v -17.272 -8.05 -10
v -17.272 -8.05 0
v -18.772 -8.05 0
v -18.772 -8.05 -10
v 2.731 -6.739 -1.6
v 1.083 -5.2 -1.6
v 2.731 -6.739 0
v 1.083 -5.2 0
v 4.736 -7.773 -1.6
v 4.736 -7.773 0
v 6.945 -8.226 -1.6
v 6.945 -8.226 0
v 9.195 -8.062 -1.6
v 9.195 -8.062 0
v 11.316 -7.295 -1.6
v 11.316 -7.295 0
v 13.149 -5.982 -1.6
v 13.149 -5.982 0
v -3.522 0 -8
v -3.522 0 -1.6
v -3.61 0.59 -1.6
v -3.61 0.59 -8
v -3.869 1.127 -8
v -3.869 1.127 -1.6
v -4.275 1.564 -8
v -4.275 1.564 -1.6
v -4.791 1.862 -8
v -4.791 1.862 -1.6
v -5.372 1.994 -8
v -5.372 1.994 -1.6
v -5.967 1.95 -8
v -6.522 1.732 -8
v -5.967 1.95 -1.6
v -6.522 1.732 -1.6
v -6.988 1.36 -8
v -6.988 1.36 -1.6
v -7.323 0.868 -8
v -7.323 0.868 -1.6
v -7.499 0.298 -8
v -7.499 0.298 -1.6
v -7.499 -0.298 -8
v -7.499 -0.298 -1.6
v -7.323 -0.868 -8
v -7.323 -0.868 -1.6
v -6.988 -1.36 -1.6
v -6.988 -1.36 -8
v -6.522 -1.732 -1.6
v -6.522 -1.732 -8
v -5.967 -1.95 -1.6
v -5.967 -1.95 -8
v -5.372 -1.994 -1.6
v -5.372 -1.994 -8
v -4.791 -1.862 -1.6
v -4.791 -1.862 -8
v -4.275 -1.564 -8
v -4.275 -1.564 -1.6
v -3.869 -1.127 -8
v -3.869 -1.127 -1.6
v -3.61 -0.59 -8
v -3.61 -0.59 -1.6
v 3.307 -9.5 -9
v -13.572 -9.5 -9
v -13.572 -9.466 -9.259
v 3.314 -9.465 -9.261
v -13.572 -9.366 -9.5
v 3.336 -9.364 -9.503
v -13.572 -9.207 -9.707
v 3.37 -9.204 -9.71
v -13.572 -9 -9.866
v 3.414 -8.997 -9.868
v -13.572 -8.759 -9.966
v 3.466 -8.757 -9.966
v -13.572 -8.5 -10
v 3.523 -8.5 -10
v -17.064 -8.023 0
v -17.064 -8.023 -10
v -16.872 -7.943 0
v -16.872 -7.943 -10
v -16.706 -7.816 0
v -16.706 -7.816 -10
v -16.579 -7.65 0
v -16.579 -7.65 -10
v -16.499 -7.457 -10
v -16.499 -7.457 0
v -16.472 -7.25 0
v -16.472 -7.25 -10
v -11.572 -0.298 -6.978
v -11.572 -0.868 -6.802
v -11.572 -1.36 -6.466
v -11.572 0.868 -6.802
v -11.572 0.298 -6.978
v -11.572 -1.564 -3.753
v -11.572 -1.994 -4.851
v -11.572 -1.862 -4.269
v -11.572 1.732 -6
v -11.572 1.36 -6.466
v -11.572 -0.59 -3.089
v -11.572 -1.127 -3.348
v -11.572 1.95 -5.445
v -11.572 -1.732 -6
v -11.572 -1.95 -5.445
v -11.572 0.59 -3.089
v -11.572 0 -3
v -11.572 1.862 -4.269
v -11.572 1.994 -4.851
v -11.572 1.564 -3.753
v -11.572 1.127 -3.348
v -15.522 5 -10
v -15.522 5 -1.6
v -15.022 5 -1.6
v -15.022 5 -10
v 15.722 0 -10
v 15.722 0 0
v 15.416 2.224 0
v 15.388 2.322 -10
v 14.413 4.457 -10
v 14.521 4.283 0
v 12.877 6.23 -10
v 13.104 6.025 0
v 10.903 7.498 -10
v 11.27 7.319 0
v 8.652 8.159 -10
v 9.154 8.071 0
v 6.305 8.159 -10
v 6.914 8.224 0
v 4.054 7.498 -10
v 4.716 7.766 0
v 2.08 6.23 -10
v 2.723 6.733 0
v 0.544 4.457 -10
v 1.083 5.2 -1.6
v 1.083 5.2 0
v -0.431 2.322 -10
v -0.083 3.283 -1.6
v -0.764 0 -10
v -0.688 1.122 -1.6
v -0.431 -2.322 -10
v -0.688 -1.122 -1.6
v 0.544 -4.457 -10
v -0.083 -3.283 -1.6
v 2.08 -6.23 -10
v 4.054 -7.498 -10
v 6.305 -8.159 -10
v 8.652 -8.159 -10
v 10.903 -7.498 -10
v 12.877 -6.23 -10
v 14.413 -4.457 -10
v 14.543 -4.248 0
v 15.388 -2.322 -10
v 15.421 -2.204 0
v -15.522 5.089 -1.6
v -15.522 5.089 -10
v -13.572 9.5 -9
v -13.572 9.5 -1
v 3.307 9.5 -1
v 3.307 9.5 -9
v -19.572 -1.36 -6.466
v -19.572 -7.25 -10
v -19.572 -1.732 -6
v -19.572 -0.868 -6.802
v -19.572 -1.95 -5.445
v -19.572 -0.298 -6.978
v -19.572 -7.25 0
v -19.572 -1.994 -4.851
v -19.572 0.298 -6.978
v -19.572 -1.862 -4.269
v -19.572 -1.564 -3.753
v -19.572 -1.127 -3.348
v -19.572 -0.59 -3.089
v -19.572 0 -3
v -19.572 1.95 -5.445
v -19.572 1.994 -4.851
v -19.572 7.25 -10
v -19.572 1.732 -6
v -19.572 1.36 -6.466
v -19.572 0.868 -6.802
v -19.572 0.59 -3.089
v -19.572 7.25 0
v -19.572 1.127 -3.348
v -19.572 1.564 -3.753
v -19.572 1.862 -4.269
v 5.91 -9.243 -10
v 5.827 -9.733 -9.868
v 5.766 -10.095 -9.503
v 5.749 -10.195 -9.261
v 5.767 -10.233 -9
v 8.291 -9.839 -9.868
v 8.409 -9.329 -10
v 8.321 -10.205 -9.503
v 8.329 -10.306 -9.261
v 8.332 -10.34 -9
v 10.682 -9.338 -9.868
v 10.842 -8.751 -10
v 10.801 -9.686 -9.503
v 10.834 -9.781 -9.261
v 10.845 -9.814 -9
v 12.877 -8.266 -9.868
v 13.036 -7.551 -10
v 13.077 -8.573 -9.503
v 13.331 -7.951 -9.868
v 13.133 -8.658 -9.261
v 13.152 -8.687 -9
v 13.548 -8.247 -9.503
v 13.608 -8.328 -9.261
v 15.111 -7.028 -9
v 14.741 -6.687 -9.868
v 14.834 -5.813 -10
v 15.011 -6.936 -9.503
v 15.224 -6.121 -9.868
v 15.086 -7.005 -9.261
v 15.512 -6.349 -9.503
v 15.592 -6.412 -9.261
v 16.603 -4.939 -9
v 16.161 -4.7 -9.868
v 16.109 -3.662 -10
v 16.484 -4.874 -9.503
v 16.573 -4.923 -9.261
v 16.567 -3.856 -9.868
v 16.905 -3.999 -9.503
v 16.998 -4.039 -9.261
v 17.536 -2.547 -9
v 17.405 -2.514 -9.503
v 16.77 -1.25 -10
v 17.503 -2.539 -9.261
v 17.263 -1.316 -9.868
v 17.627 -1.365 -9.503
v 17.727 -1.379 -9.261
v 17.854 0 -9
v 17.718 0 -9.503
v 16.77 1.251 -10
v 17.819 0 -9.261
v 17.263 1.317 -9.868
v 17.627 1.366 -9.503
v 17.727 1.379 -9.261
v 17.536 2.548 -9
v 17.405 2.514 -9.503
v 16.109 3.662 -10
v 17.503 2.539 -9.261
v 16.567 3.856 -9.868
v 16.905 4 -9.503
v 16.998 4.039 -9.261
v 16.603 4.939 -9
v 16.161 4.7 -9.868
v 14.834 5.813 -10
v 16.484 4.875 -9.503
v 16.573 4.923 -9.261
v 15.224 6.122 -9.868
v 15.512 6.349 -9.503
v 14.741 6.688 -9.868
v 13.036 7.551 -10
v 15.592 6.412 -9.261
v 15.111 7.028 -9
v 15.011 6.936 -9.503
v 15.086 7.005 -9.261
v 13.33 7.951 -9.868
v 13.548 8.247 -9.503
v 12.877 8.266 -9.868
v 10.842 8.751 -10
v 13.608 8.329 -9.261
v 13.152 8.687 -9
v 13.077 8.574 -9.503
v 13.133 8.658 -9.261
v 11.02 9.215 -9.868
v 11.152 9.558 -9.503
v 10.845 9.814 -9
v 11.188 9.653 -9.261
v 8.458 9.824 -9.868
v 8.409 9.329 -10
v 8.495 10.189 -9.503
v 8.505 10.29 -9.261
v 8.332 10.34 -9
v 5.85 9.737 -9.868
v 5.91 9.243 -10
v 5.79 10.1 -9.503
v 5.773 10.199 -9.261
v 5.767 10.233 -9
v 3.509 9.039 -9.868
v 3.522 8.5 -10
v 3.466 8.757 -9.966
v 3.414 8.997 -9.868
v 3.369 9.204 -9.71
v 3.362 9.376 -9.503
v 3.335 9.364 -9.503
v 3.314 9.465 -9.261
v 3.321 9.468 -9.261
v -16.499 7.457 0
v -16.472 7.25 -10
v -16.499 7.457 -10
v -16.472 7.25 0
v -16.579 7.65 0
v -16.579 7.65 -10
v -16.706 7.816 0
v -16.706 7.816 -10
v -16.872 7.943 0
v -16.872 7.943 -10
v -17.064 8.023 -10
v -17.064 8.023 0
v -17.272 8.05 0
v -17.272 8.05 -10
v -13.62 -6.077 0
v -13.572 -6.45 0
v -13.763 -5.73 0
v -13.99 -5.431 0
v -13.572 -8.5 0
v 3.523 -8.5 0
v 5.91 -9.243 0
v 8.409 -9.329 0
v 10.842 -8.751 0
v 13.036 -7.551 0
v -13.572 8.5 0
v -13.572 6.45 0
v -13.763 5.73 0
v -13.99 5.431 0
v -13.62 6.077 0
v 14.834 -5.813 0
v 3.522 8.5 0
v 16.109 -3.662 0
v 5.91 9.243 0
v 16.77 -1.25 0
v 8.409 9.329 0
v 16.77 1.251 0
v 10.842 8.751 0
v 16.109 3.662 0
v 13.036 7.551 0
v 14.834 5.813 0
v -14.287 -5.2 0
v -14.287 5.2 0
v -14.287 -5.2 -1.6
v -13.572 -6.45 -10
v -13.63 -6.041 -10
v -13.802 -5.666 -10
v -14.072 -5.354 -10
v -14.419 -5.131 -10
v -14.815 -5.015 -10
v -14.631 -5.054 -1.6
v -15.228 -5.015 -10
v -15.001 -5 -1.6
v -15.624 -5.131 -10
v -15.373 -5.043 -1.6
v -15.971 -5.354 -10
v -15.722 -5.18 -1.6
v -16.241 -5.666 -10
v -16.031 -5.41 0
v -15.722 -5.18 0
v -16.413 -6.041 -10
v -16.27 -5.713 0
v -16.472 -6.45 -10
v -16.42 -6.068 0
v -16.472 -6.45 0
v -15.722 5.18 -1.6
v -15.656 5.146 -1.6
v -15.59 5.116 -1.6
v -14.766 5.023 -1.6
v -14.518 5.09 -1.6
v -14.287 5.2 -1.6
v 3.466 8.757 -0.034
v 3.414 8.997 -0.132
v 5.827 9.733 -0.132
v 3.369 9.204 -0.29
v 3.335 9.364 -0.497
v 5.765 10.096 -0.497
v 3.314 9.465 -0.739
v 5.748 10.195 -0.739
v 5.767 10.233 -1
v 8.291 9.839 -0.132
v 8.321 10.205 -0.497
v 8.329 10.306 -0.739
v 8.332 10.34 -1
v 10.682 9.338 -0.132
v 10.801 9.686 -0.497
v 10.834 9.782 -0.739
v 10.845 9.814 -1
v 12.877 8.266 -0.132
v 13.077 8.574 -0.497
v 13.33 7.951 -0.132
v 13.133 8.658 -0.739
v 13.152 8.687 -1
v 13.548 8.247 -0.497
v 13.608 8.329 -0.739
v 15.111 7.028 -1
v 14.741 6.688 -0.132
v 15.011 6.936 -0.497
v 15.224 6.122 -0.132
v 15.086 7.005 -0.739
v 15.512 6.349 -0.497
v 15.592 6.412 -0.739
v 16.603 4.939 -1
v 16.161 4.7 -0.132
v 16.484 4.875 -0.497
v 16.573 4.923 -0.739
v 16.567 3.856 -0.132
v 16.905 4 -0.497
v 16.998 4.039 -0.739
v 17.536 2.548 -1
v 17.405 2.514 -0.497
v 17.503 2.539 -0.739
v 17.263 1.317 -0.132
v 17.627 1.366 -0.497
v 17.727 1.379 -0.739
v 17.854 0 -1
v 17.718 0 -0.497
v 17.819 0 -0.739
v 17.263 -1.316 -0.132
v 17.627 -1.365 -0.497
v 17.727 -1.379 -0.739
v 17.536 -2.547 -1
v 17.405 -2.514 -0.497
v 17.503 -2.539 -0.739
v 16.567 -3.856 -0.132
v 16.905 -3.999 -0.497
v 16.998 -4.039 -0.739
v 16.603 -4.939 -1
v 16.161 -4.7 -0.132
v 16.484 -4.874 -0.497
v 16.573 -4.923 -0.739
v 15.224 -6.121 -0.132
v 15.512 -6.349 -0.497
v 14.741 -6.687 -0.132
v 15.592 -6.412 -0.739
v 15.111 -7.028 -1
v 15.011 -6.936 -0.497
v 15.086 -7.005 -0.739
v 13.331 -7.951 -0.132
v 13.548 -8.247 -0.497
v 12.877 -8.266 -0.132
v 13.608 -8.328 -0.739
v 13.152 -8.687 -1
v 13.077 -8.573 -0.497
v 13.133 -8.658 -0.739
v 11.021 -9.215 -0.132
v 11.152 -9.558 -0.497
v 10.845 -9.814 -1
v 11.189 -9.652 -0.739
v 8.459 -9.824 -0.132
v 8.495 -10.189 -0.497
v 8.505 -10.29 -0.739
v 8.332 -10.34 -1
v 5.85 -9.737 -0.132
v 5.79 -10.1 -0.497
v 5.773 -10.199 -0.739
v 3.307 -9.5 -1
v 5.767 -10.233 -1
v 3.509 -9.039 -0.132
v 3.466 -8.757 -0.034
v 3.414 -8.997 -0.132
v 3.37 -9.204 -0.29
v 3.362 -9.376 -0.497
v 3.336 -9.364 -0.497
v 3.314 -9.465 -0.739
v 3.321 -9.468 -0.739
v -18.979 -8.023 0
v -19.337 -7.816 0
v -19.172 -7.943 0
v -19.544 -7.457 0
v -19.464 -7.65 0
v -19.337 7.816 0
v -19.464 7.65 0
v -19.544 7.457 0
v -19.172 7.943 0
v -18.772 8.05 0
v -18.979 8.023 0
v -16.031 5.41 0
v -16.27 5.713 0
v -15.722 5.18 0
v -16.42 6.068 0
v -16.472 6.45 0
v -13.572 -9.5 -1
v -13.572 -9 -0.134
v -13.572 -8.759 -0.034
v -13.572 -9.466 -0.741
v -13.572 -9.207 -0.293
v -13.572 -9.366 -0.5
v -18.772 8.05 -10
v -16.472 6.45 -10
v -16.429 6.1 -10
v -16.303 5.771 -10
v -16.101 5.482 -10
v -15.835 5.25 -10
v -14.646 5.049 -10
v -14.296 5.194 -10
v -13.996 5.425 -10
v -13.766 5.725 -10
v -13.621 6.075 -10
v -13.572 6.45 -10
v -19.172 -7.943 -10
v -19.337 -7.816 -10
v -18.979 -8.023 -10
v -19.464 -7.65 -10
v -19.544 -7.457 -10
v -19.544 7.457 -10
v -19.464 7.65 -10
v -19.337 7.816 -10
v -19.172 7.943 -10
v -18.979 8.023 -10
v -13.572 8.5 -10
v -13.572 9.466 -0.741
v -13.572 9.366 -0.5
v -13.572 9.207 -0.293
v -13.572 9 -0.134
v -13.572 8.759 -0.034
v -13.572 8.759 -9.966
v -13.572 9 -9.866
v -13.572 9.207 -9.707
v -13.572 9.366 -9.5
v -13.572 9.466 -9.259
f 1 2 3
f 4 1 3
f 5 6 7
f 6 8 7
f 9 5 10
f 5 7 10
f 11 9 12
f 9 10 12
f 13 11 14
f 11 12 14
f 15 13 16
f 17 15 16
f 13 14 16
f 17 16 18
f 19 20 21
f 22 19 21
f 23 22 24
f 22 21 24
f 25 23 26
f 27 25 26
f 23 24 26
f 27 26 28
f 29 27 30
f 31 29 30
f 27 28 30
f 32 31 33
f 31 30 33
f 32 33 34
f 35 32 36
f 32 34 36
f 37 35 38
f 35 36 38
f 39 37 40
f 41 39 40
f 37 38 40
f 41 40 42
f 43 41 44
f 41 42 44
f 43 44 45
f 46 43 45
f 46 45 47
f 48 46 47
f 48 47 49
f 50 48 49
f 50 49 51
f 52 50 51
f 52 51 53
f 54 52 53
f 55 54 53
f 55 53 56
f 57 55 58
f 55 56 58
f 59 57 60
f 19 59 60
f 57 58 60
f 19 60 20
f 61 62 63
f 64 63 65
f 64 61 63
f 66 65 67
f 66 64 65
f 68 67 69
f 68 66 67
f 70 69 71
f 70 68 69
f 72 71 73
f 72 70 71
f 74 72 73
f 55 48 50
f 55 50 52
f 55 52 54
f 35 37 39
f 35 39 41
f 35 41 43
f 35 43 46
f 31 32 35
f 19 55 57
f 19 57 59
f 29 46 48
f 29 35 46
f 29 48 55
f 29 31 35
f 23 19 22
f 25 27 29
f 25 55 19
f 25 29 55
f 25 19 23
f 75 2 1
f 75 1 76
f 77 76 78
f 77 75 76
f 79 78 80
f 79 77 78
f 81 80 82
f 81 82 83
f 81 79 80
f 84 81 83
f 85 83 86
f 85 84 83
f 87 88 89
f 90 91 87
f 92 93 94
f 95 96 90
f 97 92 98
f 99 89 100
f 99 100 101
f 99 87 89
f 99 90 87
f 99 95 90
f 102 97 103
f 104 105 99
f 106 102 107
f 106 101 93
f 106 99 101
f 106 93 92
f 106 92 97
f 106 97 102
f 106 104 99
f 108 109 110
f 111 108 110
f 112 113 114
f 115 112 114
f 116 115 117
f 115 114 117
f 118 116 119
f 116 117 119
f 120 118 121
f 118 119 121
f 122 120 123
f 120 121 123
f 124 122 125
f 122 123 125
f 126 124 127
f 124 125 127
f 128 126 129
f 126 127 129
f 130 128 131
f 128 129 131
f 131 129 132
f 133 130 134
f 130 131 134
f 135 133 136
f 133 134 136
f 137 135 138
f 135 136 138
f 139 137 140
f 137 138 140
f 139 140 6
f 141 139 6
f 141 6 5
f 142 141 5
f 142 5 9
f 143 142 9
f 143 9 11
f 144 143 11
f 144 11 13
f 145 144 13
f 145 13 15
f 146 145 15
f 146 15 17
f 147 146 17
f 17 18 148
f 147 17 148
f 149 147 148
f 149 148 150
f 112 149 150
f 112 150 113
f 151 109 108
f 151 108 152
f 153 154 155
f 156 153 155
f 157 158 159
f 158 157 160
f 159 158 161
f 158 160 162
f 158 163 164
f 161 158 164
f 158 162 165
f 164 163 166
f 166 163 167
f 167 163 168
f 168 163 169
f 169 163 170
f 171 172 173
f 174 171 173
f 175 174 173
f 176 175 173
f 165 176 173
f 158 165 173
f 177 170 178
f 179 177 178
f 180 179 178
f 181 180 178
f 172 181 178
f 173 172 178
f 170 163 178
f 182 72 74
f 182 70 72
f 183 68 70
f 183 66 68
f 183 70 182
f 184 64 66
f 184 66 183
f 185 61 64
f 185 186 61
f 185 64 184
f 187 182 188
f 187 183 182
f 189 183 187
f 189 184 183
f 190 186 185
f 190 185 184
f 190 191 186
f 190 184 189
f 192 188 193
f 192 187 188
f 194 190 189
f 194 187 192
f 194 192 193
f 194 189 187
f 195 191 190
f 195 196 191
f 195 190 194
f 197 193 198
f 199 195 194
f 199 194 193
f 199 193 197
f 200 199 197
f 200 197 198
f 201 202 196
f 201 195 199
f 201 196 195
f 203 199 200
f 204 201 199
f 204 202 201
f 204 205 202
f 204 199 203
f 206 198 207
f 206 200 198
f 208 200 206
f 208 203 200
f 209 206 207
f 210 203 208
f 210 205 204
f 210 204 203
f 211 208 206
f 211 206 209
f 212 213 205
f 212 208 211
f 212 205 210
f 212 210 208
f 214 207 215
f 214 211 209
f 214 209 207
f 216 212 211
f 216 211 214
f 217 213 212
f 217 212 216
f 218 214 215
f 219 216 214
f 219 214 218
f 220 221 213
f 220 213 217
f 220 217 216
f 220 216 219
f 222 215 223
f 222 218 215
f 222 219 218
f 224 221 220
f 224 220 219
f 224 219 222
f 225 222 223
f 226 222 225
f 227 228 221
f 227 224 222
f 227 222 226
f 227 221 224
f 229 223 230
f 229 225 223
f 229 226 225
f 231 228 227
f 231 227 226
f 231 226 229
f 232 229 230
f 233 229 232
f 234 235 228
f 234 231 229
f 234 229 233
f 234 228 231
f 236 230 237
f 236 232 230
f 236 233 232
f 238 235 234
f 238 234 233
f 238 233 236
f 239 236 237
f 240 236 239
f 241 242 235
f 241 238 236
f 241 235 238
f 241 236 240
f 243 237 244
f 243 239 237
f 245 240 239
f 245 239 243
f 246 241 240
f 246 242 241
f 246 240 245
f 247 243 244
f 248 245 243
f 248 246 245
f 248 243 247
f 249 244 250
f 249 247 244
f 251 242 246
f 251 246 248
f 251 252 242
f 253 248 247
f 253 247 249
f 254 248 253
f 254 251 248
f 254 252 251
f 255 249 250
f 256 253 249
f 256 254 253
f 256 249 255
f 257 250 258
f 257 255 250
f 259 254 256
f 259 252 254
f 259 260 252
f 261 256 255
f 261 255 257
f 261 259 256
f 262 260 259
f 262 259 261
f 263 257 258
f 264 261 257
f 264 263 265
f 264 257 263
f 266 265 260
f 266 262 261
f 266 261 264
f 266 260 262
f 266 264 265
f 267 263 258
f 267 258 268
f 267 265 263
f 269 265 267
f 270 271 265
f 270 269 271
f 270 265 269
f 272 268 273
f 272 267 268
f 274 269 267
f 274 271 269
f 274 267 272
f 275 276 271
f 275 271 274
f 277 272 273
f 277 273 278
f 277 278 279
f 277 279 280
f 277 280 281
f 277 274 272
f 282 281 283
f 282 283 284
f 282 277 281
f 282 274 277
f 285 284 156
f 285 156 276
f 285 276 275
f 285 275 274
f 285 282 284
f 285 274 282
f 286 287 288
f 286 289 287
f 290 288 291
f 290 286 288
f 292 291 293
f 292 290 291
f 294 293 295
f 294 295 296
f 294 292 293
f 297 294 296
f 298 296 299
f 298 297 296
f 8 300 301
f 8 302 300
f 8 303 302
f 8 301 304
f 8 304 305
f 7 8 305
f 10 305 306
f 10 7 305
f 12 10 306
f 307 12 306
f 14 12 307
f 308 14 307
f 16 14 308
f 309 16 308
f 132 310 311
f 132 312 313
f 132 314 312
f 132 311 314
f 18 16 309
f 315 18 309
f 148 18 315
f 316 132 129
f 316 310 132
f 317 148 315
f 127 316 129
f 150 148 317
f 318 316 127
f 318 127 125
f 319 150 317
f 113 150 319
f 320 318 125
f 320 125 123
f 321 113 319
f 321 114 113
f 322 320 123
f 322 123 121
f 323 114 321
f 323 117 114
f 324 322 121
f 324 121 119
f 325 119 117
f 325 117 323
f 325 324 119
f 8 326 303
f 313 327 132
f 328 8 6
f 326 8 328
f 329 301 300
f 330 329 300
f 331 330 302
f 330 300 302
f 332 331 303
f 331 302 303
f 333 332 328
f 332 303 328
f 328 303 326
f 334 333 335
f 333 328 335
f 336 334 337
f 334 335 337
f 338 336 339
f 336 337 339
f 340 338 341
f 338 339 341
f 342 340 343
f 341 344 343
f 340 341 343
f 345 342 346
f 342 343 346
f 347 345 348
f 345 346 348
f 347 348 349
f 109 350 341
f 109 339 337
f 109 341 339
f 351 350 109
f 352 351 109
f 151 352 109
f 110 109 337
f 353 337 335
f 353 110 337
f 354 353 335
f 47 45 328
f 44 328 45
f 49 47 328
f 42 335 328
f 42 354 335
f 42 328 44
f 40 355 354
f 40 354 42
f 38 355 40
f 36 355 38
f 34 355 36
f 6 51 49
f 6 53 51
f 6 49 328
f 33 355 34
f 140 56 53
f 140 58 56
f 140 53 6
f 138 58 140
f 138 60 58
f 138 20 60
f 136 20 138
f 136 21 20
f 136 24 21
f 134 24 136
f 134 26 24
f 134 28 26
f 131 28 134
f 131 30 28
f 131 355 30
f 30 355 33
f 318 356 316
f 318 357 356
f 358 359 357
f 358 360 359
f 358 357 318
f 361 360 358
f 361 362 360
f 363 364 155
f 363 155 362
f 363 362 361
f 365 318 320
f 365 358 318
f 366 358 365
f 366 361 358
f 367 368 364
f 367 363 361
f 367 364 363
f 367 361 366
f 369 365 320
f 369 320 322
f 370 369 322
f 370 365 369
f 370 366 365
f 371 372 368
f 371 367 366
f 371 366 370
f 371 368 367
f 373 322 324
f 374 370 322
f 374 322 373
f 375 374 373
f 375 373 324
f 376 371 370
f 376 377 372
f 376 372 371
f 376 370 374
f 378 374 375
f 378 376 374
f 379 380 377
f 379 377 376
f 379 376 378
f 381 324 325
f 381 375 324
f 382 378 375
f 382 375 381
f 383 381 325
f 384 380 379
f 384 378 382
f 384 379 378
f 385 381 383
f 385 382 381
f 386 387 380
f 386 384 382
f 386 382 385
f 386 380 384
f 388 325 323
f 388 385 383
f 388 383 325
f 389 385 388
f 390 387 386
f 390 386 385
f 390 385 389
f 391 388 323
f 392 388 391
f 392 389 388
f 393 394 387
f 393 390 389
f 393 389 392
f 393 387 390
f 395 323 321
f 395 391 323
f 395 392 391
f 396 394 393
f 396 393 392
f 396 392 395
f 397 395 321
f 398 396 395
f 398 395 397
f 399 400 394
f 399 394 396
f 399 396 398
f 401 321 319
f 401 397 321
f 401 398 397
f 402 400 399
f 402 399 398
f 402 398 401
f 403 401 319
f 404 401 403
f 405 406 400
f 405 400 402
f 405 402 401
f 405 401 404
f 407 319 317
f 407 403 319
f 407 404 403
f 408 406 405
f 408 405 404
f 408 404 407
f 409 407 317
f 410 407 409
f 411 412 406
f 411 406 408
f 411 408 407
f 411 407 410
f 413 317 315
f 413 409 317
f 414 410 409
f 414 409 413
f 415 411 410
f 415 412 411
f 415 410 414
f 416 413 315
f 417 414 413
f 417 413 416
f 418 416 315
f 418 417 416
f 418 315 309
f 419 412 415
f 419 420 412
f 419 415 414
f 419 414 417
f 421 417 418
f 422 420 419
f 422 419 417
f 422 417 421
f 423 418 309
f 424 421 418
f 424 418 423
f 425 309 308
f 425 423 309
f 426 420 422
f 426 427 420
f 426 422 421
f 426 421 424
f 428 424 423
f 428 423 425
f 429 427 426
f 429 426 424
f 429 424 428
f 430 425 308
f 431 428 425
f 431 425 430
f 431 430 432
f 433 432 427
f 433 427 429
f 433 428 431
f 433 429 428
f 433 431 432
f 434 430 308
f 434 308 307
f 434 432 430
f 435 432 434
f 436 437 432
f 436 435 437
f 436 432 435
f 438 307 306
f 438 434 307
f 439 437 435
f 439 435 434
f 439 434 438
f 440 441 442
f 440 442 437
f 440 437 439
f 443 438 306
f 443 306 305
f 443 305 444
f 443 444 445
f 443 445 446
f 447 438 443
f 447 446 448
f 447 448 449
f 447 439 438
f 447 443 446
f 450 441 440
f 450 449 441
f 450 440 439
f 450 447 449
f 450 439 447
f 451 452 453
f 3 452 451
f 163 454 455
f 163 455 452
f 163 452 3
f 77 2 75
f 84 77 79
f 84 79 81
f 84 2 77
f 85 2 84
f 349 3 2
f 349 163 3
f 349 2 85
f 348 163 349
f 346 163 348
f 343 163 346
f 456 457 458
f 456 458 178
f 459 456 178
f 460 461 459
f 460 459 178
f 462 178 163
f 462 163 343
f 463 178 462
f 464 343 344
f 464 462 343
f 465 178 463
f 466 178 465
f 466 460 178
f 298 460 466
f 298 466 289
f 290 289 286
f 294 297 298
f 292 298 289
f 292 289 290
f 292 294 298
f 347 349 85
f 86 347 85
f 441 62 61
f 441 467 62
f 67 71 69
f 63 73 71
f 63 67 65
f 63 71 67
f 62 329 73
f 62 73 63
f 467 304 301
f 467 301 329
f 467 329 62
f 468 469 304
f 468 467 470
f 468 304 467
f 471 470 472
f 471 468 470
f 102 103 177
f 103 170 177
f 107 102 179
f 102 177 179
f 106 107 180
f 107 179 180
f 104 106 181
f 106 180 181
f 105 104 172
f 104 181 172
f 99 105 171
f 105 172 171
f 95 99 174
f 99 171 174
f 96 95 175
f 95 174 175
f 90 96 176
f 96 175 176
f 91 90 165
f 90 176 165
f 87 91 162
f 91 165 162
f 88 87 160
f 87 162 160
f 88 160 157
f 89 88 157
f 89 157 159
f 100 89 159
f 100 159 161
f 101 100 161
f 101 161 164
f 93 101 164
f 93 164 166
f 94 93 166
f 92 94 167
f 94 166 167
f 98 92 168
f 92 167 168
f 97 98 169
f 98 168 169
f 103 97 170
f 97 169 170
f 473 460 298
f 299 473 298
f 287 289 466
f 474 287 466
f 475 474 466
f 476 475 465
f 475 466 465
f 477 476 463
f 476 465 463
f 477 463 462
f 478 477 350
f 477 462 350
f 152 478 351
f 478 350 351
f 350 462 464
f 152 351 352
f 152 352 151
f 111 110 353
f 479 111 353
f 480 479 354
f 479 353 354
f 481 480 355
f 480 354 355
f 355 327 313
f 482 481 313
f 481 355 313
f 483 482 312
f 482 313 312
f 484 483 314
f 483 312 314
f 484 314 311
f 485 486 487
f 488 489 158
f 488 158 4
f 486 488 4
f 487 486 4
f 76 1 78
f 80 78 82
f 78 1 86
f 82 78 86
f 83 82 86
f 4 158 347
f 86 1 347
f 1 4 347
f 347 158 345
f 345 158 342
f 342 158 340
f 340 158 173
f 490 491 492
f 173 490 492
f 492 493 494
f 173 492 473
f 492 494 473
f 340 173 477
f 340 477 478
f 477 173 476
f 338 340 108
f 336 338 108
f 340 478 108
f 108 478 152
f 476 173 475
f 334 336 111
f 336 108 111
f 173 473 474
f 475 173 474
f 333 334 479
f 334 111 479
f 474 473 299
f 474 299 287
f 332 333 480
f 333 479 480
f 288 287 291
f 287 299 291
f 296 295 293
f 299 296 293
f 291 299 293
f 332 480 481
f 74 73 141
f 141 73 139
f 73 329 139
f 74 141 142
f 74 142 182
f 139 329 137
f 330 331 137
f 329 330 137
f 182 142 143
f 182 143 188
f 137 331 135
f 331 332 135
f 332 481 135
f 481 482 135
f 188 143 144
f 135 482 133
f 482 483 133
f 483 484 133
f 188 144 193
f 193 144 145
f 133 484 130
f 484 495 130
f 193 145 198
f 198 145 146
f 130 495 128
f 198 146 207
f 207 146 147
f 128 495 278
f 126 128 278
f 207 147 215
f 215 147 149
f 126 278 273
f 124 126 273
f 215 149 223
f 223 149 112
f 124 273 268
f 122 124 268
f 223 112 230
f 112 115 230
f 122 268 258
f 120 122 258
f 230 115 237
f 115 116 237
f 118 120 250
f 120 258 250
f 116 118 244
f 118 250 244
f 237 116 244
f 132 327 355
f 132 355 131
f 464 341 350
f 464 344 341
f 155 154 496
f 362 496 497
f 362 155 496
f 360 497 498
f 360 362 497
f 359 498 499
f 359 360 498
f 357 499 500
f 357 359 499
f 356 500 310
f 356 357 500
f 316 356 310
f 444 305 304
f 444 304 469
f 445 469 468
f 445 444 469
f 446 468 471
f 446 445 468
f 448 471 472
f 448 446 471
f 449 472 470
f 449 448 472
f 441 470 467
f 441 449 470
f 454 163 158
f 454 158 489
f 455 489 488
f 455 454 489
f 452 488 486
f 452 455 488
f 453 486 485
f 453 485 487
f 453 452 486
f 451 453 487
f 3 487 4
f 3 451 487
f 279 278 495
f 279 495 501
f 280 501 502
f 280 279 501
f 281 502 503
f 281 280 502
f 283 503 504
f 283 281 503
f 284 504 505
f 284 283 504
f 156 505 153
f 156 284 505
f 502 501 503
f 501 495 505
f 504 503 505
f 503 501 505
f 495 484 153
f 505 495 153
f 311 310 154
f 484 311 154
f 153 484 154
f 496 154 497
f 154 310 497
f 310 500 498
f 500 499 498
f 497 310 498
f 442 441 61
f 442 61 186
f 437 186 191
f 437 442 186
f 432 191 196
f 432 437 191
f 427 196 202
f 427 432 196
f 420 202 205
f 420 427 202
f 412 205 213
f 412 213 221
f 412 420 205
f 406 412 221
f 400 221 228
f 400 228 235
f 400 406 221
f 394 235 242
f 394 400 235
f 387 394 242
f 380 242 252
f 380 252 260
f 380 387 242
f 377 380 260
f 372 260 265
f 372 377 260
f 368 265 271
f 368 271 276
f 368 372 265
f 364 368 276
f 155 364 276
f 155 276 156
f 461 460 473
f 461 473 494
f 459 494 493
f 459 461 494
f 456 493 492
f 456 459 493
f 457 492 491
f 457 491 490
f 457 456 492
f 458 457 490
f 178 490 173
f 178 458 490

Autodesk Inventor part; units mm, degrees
ref_plane "YZ Plane" through (0, 0, 0) normal (1, 0, 0) x (0, 1, 0)
ref_plane "XZ Plane" through (0, 0, 0) normal (0, 1, 0) x (-1, 0, 0)
ref_plane "XY Plane" through (0, 0, 0) normal (0, 0, 1) x (1, 0, 0)
sketch "Sketch1" plane through (0, 0, 0) normal (0, 0, 1) x (1, 0, 0)
  arc A0 (-13.7715, -6.45) -> (-16.2715, -6.45) centre (-15.0215, -6.45) ccw projected
  line L0 (-16.2715, -6.45) -> (-16.2715, -7.25) projected
  arc A1 (-17.2715, -8.25) -> (-16.2715, -7.25) centre (-17.2715, -7.25) ccw projected
  line L1 (-17.2715, -8.25) -> (-18.7715, -8.25) projected
  arc A2 (-19.7715, -7.25) -> (-18.7715, -8.25) centre (-18.7715, -7.25) ccw projected
  line L2 (-19.7715, -7.25) -> (-19.7715, 7.25) projected
  arc A3 (-18.7715, 8.25) -> (-19.7715, 7.25) centre (-18.7715, 7.25) ccw projected
  line L3 (-18.7715, 8.25) -> (-17.2715, 8.25) projected
  arc A4 (-16.2715, 7.25) -> (-17.2715, 8.25) centre (-17.2715, 7.25) ccw projected
  line L4 (-16.2715, 7.25) -> (-16.2715, 6.45) projected
  arc A5 (-16.2715, 6.45) -> (-13.7715, 6.45) centre (-15.0215, 6.45) ccw projected
  arc A6 (-13.5715, -6.45) -> (-16.4715, -6.45) centre (-15.0215, -6.45) ccw
  line L5 (-16.4715, -6.45) -> (-16.4715, -7.25)
  arc A7 (-17.2715, -8.05) -> (-16.4715, -7.25) centre (-17.2715, -7.25) ccw
  line L6 (-17.2715, -8.05) -> (-18.7715, -8.05)
  arc A8 (-19.5715, -7.25) -> (-18.7715, -8.05) centre (-18.7715, -7.25) ccw
  line L7 (-19.5715, -7.25) -> (-19.5715, 7.25)
  arc A9 (-18.7715, 8.05) -> (-19.5715, 7.25) centre (-18.7715, 7.25) ccw
  line L8 (-18.7715, 8.05) -> (-17.2715, 8.05)
  arc A10 (-16.4715, 7.25) -> (-17.2715, 8.05) centre (-17.2715, 7.25) ccw
  line L9 (-16.4715, 7.25) -> (-16.4715, 6.45)
  arc A11 (-16.4715, 6.45) -> (-13.5715, 6.45) centre (-15.0215, 6.45) ccw
  circle A12 centre (-5.5215, 0) radius 1.6 projected
  circle A13 centre (7.4785, 5) radius 0.5969 projected
  circle A14 centre (7.4785, -5) radius 0.5969 projected
  line L10 (13.4965, -5.336) -> (13.0086, -5.8402) projected
  arc A15 (13.4965, -5.336) -> (1.4605, 5.336) centre (7.4785, 0) ccw projected
  line L11 (1.1785, 5) -> (1.4605, 5.336) projected
  line L12 (-15.5215, 5) -> (1.1785, 5) projected
  line L13 (-15.5215, -5) -> (-15.5215, 5) projected
  line L14 (1.1785, -5) -> (-15.5215, -5) projected
  arc A16 (1.1785, -5) -> (13.0086, -5.8402) centre (7.4785, 0) ccw projected
  arc A17 (-0.6485, -6.45) -> (-0.6486, 6.45) centre (7.4785, 0) ccw
  line L15 (-0.6485, -6.45) -> (-15.5215, -6.45)
  line L16 (-15.5215, -6.45) -> (-15.5215, 6.45)
  line L17 (-15.5215, 6.45) -> (-0.6486, 6.45)
  line L18 (7.4785, 0) -> (-0.6485, -6.45)
  line L19 (7.4785, 0) -> (-0.6486, 6.45)
  circle A18 centre (7.4785, 0) radius 8.243
  point P0 (0, 0)
  point P1 (-15.03, 5)
  point P2 (-15.5215, 5.0889)
  point P3 (-13.5715, 6.45)
  dimension "d0" = 0.2
  dimension "d1" = 0.2
extrude "Extrusion1" add sketch "Sketch1" against normal blind 10 contours A6 L14 A18 L18 L15 | L16 L14 A6 | A6 L5 A7 L6 A8 L7 A9 L8 A10 L9 A11 L16 L13 | L14 L13 L12 A18 | L18 A18 L19 A17 | L19 A18 L12 A11 L17 | A12
sketch "Sketch2" plane through (0, 0, 0) normal (0, 0, 1) x (1, 0, 0)
  circle A0 centre (-5.5215, 0) radius 1.6 projected
  circle A1 centre (7.4785, 5) radius 0.5969 projected
  circle A2 centre (7.4785, -5) radius 0.5969 projected
  line L0 (13.4965, -5.336) -> (13.0086, -5.8402) projected
  arc A3 (13.4965, -5.336) -> (1.4605, 5.336) centre (7.4785, 0) ccw projected
  line L1 (1.1785, 5) -> (1.4605, 5.336) projected
  line L2 (-15.5215, 5) -> (1.1785, 5) projected
  line L3 (-15.5215, -5) -> (-15.5215, 5) projected
  line L4 (1.1785, -5) -> (-15.5215, -5) projected
  arc A4 (1.1785, -5) -> (13.0086, -5.8402) centre (7.4785, 0) ccw projected
  line L5 (-15.7215, 5.2) -> (1.0853, 5.2)
  line L6 (1.0853, 5.2) -> (1.309, 5.4667)
  arc A5 (13.6433, -5.472) -> (1.309, 5.4667) centre (7.4785, 0) ccw
  line L7 (13.6433, -5.472) -> (13.1493, -5.9824)
  arc A6 (1.0826, -5.2) -> (13.1493, -5.9824) centre (7.4785, 0) ccw
  line L8 (1.0826, -5.2) -> (-15.7215, -5.2)
  line L9 (-15.7215, -5.2) -> (-15.7215, 5.2)
  point P0 (0, 0)
  dimension "d4" = 0.2
extrude "Extrusion2" cut sketch "Sketch2" against normal blind 1.6 contours L0 A4 L4 L3 L2 L1 A3 | L5 L6 A5 L7 A6 L8 L9
sketch "Sketch3" plane through (-5.5215, 0, 0) normal (0, 0, 1) x (1, 0, 0)
  circle A0 centre (0, 0) radius 2
  point P0 (5.5215, 0)
  dimension "d7" = 4
extrude "Extrusion3" cut sketch "Sketch3" against normal blind 8
sketch "Sketch4" plane through (-19.5715, -7.25, 0) normal (-1, 0, 0) x (0, 0, 1)
  circle A0 centre (-5, 7.25) radius 2
  point P0 (0, 7.25)
  dimension "d10" = 4
  dimension "d11" = 5
extrude "Extrusion4" cut sketch "Sketch4" against normal blind 8
sketch "Sketch5" plane through (0, 0, 0) normal (0, 0, 1) x (1, 0, 0)
  line L0 (-13.7715, -9.5) -> (-13.7715, -6.45) projected
  line L1 (-13.7715, 6.45) -> (-13.7715, 9.5) projected
  line L2 (-13.7715, -9.5) -> (3.307, -9.5)
  arc A0 (-0.6485, -6.45) -> (-0.6486, 6.45) centre (7.4785, 0) ccw projected
  line L3 (-13.7715, 9.5) -> (3.307, 9.5)
  line L4 (-0.6485, -6.45) -> (-13.5715, -6.45) projected
  line L5 (-13.5715, -6.45) -> (-13.5715, -9.5)
  arc A1 (-15.03, 5) -> (-13.5715, 6.45) centre (-15.0215, 6.45) ccw projected
  line L6 (-13.5715, 6.45) -> (-13.5715, 9.5)
  line L7 (-0.6486, 6.45) -> (-13.5715, 6.45) projected
  point P0 (0, 0)
extrude "Extrusion5" add sketch "Sketch5" against normal up to surface (10 mm away)
fillet "Fillet2" radius 1 6 edges at (17.854, 0, 0) (-5.1322, -9.5, 0) (-5.1323, 9.5, 0) (17.854, 0, -10) (-5.1323, 9.5, -10) (-5.1322, -9.5, -10)
properties part number "TransducerPCB_Holder"
